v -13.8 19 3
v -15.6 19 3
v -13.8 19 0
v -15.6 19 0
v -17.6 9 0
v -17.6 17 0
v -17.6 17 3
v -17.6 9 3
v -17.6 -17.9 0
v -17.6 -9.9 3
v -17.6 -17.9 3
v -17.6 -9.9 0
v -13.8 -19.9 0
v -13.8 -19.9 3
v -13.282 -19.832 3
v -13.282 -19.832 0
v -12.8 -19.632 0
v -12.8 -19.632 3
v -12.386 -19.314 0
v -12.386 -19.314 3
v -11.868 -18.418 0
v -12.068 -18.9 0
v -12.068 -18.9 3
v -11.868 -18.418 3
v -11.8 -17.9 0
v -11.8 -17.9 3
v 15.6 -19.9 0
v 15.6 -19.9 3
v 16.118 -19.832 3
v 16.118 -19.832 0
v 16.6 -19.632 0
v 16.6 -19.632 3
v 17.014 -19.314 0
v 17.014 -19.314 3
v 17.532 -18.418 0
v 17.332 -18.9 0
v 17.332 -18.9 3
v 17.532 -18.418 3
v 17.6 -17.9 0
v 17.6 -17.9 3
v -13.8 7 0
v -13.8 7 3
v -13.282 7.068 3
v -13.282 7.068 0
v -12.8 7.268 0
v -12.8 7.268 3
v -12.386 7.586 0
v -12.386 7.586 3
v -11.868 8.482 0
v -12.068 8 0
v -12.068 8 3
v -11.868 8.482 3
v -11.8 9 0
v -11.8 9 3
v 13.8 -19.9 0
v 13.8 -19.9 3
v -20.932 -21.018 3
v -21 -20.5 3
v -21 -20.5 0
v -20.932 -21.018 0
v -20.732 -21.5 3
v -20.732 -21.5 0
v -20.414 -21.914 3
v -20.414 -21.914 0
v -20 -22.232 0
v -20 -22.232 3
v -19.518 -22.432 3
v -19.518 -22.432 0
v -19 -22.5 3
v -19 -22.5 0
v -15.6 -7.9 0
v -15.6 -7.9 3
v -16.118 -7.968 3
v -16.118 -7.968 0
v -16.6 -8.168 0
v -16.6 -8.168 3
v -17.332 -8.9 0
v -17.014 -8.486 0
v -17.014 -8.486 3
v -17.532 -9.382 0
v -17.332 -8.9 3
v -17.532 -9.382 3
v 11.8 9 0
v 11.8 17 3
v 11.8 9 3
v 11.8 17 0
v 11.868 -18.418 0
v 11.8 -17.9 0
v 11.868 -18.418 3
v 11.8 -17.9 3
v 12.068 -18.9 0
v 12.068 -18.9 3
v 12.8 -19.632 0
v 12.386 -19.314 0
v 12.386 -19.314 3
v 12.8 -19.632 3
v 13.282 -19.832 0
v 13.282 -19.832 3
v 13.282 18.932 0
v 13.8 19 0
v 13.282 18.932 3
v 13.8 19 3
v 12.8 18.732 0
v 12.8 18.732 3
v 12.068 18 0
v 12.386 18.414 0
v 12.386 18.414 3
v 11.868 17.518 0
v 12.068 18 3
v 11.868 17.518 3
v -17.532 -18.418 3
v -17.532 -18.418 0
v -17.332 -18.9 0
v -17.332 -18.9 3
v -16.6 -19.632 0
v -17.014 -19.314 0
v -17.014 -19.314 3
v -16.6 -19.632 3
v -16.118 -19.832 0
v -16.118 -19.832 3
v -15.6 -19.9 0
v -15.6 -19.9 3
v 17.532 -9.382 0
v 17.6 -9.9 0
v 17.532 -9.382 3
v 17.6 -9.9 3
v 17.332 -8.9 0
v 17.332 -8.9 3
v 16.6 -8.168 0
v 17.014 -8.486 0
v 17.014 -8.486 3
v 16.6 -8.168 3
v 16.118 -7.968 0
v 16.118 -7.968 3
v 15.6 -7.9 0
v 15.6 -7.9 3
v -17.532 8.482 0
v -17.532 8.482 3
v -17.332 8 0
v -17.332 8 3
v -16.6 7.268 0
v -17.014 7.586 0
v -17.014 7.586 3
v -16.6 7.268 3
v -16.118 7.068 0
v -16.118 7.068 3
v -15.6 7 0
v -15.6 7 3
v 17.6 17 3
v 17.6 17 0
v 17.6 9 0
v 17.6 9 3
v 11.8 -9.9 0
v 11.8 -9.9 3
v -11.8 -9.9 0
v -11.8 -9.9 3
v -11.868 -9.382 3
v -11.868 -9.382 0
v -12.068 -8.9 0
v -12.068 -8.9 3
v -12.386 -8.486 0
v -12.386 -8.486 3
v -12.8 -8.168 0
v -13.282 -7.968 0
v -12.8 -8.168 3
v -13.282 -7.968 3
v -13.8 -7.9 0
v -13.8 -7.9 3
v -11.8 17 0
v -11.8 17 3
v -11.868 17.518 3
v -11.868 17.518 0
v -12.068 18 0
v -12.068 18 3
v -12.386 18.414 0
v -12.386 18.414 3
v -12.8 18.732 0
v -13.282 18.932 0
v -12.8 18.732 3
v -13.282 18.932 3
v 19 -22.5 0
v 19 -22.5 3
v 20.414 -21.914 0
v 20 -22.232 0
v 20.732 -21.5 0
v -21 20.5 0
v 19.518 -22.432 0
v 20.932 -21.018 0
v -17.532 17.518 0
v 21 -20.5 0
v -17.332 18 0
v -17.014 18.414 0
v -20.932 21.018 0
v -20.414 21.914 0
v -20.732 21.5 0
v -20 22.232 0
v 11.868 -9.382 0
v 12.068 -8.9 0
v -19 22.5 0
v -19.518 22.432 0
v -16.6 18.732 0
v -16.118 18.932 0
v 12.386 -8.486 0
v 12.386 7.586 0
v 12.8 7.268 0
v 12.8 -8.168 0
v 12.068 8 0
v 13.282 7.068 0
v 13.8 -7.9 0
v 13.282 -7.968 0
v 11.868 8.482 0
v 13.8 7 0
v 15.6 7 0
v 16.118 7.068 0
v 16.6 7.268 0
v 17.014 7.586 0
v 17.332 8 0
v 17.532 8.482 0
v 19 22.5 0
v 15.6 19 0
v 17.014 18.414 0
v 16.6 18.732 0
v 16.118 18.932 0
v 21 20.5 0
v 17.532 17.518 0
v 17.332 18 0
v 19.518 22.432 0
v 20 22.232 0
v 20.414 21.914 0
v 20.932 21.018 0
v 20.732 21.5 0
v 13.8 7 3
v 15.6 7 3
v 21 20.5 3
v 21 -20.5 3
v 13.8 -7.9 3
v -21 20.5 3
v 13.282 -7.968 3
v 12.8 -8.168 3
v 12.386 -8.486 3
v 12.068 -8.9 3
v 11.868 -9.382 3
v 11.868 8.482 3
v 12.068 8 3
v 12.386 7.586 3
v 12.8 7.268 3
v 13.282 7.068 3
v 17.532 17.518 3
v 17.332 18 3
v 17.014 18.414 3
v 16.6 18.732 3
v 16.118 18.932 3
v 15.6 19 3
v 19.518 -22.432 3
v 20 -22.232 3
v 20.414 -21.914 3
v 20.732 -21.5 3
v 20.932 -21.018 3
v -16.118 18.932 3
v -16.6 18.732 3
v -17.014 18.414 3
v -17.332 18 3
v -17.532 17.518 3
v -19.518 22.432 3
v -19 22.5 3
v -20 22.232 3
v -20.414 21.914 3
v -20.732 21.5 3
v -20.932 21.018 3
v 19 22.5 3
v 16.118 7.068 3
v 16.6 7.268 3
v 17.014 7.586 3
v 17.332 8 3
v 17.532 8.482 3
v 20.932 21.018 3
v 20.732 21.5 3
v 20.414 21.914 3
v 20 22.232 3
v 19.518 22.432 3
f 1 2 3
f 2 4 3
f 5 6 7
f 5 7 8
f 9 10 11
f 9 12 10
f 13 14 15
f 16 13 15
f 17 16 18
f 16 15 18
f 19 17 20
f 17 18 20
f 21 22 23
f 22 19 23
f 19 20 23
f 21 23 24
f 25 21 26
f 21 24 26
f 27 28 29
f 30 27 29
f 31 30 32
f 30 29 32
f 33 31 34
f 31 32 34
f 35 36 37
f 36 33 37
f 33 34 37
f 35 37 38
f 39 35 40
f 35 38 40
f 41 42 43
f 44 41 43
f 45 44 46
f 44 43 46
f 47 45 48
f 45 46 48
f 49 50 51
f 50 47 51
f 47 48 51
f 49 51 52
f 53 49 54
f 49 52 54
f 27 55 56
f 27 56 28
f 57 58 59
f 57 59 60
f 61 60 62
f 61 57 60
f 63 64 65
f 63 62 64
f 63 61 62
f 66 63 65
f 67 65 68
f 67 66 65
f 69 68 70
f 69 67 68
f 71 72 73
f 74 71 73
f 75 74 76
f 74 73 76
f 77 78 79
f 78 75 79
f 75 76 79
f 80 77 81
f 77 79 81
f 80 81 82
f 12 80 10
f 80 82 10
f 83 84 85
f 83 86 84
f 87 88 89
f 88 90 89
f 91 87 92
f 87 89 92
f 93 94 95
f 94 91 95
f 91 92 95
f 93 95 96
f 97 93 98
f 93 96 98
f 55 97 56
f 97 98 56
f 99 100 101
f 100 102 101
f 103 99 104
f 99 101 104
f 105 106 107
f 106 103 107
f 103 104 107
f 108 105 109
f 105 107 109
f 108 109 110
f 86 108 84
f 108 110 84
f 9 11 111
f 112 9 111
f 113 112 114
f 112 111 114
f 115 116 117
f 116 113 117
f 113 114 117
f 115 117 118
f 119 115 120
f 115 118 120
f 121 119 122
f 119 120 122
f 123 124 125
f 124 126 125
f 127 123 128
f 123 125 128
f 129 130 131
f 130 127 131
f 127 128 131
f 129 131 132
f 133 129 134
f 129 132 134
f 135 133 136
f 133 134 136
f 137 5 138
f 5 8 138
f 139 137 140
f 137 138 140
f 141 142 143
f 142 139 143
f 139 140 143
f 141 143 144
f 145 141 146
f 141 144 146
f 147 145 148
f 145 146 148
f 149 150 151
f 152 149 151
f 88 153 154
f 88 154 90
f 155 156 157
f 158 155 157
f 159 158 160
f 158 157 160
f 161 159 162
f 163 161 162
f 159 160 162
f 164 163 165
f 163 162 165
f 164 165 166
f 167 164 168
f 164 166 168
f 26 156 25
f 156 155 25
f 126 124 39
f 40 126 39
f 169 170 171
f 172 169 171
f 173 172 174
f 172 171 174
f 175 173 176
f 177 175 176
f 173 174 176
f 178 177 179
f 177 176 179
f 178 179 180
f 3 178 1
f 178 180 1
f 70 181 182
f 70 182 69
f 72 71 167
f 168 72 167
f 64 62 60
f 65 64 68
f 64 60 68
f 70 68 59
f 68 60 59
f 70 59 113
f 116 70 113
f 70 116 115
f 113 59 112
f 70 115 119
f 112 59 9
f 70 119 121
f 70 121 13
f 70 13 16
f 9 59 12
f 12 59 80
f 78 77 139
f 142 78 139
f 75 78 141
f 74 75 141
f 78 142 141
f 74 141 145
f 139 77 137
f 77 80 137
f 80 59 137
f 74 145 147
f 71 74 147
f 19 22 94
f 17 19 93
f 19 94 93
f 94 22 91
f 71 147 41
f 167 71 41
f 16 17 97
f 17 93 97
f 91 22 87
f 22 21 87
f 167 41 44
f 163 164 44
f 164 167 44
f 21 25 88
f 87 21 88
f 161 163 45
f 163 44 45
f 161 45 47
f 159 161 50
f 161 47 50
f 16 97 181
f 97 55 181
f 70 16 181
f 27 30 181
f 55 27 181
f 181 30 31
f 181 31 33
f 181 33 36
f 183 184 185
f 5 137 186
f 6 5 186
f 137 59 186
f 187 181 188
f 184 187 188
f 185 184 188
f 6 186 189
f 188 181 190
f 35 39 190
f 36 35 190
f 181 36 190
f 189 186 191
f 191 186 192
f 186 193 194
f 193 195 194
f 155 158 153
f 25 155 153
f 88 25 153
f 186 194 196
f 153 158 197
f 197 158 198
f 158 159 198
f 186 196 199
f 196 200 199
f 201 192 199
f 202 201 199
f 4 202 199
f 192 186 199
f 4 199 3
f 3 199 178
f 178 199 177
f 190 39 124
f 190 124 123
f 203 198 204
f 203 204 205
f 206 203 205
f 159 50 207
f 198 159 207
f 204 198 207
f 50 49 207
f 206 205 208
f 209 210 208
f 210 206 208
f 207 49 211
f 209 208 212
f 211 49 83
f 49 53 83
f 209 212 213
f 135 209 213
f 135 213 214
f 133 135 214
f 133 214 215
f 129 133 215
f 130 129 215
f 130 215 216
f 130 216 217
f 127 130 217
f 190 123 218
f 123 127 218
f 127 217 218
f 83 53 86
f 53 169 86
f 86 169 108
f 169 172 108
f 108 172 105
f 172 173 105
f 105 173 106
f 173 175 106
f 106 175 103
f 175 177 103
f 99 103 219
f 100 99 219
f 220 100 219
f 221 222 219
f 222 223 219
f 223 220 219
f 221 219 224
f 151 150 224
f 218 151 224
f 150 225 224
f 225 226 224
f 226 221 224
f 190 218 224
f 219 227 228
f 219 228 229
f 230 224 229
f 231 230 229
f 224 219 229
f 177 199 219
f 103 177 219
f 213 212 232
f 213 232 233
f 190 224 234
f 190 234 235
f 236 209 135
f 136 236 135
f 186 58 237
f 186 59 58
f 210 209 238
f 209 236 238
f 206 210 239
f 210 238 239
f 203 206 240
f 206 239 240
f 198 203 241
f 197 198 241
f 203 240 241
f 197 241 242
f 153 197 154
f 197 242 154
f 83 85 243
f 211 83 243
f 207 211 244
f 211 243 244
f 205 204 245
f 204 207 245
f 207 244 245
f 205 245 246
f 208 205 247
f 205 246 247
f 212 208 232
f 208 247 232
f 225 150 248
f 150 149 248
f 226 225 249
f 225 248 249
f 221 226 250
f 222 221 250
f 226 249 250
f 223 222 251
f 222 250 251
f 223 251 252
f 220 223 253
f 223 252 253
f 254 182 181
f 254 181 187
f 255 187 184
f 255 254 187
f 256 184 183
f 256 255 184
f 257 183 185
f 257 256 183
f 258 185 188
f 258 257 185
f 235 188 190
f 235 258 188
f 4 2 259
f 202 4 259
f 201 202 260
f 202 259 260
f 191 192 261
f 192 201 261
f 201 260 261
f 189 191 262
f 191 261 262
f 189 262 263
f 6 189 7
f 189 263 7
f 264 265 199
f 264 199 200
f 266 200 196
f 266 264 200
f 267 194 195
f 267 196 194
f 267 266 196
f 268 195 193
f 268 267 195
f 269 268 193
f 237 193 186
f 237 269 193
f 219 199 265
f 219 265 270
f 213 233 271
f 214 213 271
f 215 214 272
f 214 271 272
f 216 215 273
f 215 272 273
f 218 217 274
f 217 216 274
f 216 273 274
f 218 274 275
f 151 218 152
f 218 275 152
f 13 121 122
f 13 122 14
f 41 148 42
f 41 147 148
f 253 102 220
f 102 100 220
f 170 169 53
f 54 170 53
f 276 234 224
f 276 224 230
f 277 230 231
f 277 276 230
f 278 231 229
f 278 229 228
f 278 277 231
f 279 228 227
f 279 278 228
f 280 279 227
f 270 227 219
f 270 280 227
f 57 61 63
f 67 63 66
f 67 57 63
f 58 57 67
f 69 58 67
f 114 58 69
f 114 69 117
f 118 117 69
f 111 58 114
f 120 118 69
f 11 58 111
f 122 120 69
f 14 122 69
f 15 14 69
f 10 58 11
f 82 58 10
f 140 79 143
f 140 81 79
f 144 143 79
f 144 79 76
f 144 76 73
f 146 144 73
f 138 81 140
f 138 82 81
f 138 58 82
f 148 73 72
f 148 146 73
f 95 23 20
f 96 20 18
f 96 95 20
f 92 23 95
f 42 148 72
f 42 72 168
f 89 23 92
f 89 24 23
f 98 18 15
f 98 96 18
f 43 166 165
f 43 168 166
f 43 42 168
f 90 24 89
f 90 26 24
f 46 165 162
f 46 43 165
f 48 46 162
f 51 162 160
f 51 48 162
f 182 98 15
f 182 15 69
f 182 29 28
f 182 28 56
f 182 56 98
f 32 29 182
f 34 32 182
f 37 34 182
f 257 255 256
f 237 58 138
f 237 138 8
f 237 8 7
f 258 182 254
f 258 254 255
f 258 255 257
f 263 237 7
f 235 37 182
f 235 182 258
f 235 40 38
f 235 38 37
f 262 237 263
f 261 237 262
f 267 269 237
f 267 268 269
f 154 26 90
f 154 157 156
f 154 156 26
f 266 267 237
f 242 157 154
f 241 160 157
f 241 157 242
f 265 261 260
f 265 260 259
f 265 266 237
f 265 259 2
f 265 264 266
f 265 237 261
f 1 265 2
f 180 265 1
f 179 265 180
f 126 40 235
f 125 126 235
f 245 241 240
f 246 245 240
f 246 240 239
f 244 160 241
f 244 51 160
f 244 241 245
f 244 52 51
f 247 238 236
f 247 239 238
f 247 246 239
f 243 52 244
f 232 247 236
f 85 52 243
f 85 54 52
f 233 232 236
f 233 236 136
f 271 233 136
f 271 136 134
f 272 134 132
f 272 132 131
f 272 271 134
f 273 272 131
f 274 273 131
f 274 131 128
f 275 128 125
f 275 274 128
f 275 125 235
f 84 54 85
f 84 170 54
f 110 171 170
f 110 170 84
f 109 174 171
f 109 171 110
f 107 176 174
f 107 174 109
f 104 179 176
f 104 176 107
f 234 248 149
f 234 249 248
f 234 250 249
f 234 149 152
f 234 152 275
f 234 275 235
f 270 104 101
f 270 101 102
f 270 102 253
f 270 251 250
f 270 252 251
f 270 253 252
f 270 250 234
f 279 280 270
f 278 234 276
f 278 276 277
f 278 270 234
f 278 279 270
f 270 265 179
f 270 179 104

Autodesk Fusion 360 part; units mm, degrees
sketch "Sketch1" plane through (0, 0, 0) normal (0, 0, 1) x (1, 0, 0)
  line L0 (21, -22.5) -> (-21, -22.5)
  line L1 (-21, -22.5) -> (-21, 22.5)
  line L2 (-21, 22.5) -> (21, 22.5)
  line L3 (21, 22.5) -> (21, -22.5)
  line L4 (21, -22.5) -> (-21, 22.5) construction
  line L5 (-21, -22.5) -> (21, 22.5) construction
  line L6 (0, 22.5) -> (0, -22.5)
  line L7 (-21, 0) -> (21, 0)
  line L8 (17.6, 19) -> (17.6, 7)
  line L9 (17.6, -7.9) -> (17.6, -19.9)
  line L10 (11.8, 19) -> (11.8, 7)
  line L11 (11.8, -7.9) -> (11.8, -19.9)
  line L12 (-11.8, 19) -> (-11.8, 7)
  line L13 (-11.8, -7.9) -> (-11.8, -19.9)
  line L14 (-17.6, 19) -> (-17.6, 7)
  line L15 (-17.6, -7.9) -> (-17.6, -19.9)
  line L16 (-17.7333, 19) -> (-11.8, 19)
  line L17 (11.8, 19) -> (17.7333, 19)
  line L18 (-17.6, 7) -> (-11.8, 7)
  line L19 (11.8, 7) -> (17.6, 7)
  line L20 (-17.6, -7.9) -> (-11.8, -7.9)
  line L21 (11.8, -7.9) -> (17.6, -7.9)
  line L22 (-17.6, -19.9) -> (-11.8, -19.9)
  line L23 (11.8, -19.9) -> (17.6, -19.9)
  dimension "d1" = 42
  dimension "d2" = 45
  dimension "d5" = 3.5
  dimension "d6" = 15.5
  dimension "d7" = 30.4
  dimension "d8" = 42.4
extrude "Extrude1" add sketch "Sketch1" along normal blind 3
fillet "Fillet1" radius 2 4 edges at (-21, 22.5, 1.5) (21, 22.5, 1.5) (21, -22.5, 1.5) (-21, -22.5, 1.5)
fillet "Fillet2" radius 2 4 edges at (17.6, 7, 1.5) (11.8, 7, 1.5) (11.8, 19, 1.5) (17.6, 19, 1.5)
fillet "Fillet3" radius 2 4 edges at (-17.6, 19, 1.5) (-11.8, 19, 1.5) (-11.8, 7, 1.5) (-17.6, 7, 1.5)
fillet "Fillet4" radius 2 4 edges at (-11.8, -19.9, 1.5) (-17.6, -19.9, 1.5) (-17.6, -7.9, 1.5) (-11.8, -7.9, 1.5)
fillet "Fillet5" radius 2 4 edges at (11.8, -7.9, 1.5) (17.6, -7.9, 1.5) (11.8, -19.9, 1.5) (17.6, -19.9, 1.5)
